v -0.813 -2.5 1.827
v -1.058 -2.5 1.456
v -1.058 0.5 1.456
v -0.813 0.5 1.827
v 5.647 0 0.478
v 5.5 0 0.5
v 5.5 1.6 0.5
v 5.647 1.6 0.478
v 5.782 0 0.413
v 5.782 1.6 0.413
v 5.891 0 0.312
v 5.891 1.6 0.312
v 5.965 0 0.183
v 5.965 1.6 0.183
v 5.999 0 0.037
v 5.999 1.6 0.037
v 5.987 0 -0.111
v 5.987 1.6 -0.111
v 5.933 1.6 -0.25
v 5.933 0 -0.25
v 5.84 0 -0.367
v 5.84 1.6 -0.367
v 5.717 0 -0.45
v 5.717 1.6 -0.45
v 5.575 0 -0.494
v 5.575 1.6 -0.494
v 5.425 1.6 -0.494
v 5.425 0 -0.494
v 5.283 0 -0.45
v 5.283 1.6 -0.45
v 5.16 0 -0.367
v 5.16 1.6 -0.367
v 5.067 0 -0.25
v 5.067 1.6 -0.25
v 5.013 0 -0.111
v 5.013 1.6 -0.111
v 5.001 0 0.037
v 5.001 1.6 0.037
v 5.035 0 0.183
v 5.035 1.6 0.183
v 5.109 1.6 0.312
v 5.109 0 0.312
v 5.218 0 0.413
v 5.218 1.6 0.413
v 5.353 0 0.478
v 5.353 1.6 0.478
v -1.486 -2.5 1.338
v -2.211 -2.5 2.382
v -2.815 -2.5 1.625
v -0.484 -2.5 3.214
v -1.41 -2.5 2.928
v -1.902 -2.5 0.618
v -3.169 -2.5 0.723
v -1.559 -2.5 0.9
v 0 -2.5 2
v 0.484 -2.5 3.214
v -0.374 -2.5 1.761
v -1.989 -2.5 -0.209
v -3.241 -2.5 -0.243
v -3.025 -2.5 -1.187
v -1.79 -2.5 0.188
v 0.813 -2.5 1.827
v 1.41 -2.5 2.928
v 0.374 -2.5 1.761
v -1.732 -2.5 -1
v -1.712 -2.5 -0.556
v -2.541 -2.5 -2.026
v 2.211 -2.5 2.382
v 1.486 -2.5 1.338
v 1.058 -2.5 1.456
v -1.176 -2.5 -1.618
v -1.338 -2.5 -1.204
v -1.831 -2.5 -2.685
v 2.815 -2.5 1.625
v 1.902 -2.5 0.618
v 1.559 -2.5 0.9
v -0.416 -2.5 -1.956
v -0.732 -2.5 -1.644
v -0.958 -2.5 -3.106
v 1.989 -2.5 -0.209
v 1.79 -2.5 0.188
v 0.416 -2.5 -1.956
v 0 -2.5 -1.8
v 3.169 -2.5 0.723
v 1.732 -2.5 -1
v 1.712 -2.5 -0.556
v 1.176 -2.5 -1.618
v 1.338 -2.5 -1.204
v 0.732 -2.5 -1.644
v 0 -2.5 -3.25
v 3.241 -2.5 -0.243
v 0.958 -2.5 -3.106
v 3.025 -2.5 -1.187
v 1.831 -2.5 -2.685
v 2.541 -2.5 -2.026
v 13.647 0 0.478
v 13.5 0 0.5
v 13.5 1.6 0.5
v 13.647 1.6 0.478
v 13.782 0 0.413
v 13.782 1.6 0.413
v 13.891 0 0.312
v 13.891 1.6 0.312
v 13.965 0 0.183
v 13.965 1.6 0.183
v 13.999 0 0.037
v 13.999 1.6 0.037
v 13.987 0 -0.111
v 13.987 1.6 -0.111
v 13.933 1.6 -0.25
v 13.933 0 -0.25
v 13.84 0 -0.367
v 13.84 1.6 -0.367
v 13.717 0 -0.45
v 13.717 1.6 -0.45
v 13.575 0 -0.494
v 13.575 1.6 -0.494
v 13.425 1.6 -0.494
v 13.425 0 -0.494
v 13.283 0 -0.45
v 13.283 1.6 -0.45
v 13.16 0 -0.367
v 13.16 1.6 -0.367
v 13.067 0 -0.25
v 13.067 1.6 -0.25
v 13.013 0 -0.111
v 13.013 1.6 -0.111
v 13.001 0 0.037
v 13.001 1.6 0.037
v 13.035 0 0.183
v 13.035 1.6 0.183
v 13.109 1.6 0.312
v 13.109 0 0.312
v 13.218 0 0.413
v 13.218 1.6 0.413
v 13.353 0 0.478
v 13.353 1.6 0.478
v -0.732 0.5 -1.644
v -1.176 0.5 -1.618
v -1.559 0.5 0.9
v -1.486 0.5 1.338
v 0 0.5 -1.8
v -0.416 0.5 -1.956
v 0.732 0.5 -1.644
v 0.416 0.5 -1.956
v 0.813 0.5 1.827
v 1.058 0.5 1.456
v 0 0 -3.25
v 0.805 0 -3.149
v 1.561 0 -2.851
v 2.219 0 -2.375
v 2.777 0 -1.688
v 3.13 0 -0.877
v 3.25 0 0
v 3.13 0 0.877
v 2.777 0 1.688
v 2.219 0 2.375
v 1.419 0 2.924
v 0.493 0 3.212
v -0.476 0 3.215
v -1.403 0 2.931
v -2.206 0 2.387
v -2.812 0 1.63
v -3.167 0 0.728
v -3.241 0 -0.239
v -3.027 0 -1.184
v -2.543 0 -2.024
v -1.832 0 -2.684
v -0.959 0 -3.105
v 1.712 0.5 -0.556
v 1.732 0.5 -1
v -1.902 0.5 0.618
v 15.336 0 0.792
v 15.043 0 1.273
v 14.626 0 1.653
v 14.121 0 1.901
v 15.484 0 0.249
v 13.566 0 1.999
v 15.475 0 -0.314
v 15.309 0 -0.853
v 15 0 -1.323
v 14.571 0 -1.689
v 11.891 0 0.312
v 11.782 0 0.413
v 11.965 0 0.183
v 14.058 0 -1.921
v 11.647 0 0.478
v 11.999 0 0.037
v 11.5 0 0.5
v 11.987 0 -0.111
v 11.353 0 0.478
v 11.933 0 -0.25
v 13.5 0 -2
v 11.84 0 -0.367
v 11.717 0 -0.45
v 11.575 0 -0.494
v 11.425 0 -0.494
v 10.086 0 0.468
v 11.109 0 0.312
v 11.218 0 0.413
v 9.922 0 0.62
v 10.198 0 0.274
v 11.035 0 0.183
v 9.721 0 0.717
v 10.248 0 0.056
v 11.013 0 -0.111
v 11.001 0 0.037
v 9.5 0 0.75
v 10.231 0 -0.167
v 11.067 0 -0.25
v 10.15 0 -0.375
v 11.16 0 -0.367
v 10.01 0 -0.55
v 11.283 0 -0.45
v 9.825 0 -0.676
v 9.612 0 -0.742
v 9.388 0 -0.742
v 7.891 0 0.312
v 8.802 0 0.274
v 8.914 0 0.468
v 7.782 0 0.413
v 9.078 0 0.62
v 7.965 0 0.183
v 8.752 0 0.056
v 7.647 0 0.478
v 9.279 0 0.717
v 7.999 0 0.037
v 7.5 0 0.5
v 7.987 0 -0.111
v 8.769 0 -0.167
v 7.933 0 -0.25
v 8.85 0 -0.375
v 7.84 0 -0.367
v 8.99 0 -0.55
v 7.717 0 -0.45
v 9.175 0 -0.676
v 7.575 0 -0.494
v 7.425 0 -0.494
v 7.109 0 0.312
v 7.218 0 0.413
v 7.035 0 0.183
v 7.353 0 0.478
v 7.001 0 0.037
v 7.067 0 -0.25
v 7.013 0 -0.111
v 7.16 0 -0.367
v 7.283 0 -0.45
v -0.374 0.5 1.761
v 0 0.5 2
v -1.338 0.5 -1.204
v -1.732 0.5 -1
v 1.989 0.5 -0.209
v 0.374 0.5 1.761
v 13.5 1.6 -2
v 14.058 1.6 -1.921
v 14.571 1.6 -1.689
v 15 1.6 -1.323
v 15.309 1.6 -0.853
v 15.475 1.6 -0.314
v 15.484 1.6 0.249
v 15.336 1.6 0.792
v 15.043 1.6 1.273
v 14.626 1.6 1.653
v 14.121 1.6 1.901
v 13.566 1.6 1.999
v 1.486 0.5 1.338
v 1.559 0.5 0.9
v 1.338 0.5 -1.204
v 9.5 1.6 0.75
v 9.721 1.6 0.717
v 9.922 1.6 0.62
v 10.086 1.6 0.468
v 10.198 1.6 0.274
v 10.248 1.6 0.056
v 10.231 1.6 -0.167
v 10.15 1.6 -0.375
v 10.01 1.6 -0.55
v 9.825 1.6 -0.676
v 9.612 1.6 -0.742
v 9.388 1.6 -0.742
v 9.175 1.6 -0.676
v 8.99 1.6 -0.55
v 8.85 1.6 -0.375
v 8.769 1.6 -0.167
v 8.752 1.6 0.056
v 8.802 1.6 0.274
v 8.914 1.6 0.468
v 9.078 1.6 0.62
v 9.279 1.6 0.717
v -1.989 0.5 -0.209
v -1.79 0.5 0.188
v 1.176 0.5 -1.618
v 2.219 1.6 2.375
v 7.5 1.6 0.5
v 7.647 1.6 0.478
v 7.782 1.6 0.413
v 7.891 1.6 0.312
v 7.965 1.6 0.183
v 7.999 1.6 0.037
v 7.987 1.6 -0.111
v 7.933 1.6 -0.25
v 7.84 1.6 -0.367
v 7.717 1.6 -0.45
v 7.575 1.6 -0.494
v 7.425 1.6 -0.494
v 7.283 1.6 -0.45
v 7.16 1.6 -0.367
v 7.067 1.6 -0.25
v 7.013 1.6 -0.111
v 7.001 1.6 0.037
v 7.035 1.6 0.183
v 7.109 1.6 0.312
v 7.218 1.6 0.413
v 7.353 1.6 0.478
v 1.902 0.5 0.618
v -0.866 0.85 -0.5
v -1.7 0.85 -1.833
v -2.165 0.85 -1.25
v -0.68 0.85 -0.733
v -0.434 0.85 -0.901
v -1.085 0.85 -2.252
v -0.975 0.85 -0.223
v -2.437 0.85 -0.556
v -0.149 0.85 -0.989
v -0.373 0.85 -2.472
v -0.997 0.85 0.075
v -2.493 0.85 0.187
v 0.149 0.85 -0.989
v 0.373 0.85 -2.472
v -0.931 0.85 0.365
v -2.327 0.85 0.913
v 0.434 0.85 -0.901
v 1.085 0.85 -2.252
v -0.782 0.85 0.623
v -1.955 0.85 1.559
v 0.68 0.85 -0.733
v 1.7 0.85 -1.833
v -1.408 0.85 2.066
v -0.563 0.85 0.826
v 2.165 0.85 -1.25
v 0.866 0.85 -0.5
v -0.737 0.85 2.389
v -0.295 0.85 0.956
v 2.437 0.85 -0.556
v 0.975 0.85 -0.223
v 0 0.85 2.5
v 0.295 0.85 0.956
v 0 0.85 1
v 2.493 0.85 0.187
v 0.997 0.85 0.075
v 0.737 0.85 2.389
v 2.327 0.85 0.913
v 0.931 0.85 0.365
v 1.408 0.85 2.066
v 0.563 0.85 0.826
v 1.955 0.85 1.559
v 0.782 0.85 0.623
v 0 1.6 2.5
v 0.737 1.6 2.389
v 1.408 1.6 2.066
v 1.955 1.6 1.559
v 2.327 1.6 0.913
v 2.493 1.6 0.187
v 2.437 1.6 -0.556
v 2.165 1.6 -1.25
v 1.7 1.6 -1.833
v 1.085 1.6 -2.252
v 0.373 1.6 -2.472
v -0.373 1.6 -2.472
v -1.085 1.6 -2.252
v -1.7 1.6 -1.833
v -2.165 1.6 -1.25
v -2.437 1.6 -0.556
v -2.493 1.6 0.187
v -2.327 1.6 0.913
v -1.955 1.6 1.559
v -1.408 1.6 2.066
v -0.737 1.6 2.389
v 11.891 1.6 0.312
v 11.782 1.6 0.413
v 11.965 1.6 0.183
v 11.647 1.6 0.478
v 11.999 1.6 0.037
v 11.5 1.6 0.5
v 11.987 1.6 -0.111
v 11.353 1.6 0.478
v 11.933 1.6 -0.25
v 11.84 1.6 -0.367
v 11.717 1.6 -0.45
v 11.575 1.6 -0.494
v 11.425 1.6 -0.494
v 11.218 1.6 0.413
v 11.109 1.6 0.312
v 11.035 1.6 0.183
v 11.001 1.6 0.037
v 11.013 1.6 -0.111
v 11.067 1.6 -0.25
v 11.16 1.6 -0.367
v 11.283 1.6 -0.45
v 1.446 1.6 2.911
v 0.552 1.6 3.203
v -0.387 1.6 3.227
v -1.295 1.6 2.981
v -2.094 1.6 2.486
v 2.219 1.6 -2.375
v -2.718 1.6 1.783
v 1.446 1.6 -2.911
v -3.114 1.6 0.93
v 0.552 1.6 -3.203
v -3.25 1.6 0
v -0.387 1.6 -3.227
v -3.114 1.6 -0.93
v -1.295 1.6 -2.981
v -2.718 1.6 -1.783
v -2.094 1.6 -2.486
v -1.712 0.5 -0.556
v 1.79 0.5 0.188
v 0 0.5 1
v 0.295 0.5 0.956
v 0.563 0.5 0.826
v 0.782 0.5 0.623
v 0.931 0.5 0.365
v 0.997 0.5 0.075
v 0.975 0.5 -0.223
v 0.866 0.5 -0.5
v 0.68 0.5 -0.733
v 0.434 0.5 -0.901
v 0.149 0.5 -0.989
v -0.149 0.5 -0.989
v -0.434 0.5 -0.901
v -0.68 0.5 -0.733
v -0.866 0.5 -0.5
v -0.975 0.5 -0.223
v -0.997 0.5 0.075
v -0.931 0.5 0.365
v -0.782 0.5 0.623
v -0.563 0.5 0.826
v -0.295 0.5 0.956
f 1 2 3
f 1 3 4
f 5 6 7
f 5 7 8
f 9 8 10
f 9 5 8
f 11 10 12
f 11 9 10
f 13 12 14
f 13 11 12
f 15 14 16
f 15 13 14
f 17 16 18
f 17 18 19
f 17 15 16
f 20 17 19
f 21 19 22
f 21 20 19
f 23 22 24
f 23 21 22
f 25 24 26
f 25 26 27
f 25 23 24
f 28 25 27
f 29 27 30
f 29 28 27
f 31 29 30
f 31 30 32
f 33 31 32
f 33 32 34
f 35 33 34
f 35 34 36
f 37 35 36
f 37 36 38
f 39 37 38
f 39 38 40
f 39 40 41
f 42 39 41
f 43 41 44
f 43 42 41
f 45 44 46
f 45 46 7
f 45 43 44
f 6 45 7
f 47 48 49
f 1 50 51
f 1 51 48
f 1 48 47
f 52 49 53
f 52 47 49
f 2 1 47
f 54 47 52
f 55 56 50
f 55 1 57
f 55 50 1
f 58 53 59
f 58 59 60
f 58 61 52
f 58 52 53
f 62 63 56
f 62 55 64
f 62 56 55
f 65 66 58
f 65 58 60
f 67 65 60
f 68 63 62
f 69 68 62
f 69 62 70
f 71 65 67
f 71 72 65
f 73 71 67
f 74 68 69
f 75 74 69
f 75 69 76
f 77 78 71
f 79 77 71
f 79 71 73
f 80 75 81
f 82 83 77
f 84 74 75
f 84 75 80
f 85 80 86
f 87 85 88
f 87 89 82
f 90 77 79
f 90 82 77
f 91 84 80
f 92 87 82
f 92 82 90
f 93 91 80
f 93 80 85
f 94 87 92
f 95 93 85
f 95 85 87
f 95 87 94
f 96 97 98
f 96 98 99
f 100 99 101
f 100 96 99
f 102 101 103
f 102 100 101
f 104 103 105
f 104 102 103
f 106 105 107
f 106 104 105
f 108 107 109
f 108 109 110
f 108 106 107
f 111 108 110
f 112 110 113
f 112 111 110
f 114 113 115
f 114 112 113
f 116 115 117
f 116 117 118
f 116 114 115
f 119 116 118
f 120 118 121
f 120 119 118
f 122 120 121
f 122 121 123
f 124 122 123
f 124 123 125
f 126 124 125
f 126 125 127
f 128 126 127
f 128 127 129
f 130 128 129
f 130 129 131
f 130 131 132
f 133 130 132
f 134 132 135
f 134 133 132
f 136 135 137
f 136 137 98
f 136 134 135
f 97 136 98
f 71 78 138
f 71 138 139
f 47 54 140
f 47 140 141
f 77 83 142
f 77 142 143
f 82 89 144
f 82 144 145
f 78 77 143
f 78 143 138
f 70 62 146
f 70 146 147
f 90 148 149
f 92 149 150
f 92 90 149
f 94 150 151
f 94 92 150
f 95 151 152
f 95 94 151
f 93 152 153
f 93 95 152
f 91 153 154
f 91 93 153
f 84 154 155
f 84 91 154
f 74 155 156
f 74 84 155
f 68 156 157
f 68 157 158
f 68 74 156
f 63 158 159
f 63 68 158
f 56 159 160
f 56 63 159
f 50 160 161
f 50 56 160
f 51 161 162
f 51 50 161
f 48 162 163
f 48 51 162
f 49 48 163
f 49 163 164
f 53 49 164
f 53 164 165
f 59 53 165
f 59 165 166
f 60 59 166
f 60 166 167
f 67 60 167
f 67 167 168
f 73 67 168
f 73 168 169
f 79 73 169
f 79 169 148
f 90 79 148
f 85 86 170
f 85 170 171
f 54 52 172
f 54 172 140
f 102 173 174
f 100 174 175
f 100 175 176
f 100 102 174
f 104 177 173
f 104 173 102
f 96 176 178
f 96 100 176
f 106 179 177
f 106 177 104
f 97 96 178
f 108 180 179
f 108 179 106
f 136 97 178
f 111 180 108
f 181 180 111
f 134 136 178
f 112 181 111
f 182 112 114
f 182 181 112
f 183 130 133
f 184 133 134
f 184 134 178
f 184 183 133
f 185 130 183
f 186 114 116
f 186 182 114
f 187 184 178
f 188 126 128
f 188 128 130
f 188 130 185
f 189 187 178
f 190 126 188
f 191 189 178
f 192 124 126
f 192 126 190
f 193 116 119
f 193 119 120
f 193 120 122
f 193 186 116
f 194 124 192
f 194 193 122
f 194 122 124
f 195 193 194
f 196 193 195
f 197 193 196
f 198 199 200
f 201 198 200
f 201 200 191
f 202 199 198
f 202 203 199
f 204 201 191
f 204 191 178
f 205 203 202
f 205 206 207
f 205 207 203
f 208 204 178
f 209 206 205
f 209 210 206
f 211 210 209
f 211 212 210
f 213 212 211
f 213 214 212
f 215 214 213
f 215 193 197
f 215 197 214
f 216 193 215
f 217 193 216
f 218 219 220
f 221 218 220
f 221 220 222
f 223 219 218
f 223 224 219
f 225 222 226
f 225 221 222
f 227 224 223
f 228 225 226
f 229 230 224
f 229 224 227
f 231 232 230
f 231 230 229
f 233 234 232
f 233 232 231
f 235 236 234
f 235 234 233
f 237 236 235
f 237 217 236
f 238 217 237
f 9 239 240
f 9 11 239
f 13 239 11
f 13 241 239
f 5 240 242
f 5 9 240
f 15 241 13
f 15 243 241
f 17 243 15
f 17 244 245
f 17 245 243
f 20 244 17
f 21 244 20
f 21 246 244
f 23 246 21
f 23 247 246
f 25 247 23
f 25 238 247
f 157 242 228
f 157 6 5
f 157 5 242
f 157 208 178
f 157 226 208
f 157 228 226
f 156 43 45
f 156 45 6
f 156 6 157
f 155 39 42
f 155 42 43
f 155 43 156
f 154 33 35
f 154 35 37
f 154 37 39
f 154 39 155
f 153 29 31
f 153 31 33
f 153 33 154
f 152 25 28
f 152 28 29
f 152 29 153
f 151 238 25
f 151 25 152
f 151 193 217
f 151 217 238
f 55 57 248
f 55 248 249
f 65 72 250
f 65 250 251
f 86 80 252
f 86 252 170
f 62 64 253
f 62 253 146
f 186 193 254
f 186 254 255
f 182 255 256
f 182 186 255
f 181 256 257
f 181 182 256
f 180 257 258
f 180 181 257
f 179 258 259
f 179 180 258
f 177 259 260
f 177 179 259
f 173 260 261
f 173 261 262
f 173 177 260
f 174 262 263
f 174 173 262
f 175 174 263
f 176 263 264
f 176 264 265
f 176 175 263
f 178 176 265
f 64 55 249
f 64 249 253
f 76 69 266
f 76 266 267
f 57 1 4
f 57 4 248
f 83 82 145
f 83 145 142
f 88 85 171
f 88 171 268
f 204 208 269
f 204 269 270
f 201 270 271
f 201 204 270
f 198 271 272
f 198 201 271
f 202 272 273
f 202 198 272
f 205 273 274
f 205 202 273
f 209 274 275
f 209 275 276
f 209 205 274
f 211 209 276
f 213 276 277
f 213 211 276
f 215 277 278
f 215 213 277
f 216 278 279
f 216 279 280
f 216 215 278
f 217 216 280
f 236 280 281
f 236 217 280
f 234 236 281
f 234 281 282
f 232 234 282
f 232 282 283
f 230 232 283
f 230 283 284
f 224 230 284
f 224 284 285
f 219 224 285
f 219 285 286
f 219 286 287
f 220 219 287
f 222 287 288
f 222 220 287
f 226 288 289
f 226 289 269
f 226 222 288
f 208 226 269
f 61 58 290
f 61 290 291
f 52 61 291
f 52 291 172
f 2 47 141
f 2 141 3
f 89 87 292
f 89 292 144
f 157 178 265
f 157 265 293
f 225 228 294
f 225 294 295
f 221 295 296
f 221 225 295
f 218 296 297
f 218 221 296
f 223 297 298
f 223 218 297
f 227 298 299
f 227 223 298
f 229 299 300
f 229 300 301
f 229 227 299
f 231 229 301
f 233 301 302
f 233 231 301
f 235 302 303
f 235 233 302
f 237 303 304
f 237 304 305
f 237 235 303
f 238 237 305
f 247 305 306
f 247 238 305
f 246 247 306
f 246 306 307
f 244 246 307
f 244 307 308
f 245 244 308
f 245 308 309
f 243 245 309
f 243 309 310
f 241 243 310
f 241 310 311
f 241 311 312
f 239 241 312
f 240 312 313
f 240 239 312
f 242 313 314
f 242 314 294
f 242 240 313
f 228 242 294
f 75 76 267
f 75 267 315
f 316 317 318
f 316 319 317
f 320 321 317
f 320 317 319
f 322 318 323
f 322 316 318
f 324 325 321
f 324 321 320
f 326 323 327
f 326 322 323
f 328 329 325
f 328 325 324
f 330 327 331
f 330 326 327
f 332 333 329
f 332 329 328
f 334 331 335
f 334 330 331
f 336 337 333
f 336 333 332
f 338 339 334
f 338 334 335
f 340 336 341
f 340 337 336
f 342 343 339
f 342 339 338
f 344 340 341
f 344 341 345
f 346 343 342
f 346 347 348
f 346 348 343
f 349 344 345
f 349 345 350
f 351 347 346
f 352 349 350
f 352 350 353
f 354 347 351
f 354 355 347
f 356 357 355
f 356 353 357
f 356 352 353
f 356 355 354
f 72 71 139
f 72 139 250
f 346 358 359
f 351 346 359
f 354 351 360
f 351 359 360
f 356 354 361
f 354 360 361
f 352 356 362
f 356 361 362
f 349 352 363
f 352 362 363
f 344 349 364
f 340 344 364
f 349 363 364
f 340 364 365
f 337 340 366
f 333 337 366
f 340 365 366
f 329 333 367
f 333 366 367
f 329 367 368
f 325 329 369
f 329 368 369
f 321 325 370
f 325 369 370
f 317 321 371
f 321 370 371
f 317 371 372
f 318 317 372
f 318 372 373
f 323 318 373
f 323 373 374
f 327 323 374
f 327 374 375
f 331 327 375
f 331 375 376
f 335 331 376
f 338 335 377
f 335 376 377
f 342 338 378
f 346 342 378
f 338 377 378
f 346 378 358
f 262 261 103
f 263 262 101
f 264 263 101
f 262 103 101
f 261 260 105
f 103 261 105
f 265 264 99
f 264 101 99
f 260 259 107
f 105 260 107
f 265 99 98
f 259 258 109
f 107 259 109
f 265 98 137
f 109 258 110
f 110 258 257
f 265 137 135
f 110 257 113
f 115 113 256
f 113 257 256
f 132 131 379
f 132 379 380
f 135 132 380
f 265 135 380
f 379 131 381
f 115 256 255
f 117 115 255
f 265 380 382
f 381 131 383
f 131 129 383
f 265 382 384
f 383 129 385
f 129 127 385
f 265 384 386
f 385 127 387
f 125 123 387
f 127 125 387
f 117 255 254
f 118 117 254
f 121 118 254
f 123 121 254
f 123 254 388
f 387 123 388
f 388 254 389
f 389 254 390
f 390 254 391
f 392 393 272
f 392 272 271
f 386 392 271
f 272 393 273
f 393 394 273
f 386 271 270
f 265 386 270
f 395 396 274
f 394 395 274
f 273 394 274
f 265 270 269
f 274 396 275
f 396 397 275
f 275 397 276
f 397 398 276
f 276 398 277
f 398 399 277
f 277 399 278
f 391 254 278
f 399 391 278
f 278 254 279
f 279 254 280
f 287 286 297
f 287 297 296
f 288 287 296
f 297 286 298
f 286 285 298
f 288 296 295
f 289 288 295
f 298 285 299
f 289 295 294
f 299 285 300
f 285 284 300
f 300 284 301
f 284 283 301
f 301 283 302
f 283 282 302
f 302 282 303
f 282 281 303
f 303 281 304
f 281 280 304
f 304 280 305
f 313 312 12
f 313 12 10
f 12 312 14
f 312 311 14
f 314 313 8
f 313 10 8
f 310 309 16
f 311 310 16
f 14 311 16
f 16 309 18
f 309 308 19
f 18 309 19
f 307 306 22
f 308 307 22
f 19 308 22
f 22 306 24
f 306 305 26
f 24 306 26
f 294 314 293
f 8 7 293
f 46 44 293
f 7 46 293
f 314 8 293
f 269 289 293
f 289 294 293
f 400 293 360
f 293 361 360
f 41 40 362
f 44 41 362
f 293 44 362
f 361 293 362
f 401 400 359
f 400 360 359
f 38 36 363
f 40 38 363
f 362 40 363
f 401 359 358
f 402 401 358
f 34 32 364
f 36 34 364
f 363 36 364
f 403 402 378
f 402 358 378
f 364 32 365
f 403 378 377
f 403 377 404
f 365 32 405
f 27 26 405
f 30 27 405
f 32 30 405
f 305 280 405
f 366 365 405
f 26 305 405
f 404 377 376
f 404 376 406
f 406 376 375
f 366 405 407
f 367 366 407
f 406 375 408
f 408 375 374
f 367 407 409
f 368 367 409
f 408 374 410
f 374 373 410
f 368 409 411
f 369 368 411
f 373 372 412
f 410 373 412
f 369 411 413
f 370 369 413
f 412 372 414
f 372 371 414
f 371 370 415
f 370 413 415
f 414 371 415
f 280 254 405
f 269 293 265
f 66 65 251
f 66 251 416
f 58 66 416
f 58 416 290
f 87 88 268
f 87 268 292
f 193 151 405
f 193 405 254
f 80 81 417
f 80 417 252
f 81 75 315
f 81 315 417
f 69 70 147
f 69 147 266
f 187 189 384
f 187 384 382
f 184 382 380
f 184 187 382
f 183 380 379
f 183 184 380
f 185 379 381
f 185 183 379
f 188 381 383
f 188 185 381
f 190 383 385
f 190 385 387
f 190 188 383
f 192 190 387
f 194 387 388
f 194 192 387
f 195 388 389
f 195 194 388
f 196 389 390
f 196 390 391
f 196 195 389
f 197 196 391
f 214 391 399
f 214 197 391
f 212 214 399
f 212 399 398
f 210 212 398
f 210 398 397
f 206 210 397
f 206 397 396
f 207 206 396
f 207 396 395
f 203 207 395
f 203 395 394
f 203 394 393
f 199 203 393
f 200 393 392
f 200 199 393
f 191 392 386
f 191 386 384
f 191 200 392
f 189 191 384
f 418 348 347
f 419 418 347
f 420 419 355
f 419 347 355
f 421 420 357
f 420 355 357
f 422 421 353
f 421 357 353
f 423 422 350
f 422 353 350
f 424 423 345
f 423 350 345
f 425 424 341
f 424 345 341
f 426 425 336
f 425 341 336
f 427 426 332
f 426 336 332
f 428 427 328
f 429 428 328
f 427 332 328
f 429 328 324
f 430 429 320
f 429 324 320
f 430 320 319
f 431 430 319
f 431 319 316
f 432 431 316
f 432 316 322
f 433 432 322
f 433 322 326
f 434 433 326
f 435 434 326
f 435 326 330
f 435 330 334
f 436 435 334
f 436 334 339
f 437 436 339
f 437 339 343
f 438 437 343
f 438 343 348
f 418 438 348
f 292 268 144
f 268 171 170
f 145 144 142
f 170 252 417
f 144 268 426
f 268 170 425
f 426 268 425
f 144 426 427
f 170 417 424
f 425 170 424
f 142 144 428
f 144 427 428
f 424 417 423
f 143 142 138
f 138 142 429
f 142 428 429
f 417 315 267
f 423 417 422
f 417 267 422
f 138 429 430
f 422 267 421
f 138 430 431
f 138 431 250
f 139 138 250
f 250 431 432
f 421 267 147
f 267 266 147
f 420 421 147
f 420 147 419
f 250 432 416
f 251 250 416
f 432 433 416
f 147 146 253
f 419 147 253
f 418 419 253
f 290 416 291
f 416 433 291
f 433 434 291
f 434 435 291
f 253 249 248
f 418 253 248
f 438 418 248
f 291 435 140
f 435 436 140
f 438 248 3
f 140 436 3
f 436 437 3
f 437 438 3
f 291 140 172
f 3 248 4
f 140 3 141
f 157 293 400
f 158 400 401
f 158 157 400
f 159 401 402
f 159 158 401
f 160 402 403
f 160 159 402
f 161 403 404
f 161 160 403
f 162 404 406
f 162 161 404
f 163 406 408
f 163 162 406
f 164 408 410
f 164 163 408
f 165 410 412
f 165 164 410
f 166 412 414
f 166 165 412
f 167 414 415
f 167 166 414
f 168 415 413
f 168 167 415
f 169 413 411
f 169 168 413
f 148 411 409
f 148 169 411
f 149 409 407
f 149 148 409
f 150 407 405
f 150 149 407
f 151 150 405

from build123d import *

# Parameters (mm, degrees)
SKETCH1_R           = 0.5
SKETCH1_R_2         = 0.75
BOSS_EXTRUDE1_DEPTH = 1.6
BOSS_EXTRUDE2_START = 2.5
SKETCH2_R           = 3.25
BOSS_EXTRUDE2_DEPTH = 2.5
SKETCH4_R           = 1
CUT_EXTRUDE1_DEPTH  = 17.359171739
CUT_EXTRUDE2_DEPTH  = 3
SKETCH3_R           = 2.5
CUT_EXTRUDE3_DEPTH  = 0.75


with BuildPart() as part:
    # Sketch1 → Boss-Extrude1 (new body)
    with BuildSketch(Plane(origin=(0, 0, 0), x_dir=(1, 0, 0), z_dir=(0, 1, 0))):
        with BuildLine():
            Line((2.218529919, 2.375), (13.5, 2))
            ThreePointArc((13.5, 2), (15.499725592, 0.033129364), (13.566249638, -1.998902445))
            Line((13.566249638, -1.998902445), (2.218529919, -2.375))
            ThreePointArc((2.218529919, -2.375), (-3.25, 0), (2.218529919, 2.375))
        make_face()
        with Locations(Location((13.5, 0, 0), (0, 0, 270))):
            Circle(SKETCH1_R, mode=Mode.SUBTRACT)
        with Locations(Location((11.5, 0, 0), (0, 0, 270))):
            Circle(SKETCH1_R, mode=Mode.SUBTRACT)
        with Locations(Location((9.5, 0, 0), (0, 0, 270))):
            Circle(SKETCH1_R_2, mode=Mode.SUBTRACT)
        with Locations(Location((7.5, 0, 0), (0, 0, 270))):
            Circle(SKETCH1_R, mode=Mode.SUBTRACT)
        with Locations(Location((5.5, 0, 0), (0, 0, 270))):
            Circle(SKETCH1_R, mode=Mode.SUBTRACT)
    extrude(amount=BOSS_EXTRUDE1_DEPTH)

    # Sketch2 → Boss-Extrude2 (add)
    with BuildSketch(Plane.XZ.offset(BOSS_EXTRUDE2_START)):
        with Locations(Location((0, 0, 0), (0, 0, 270))):
            Circle(SKETCH2_R)
    extrude(amount=-BOSS_EXTRUDE2_DEPTH)

    # Sketch4 → Cut-Extrude1 (cut, through all)
    with BuildSketch(Plane(origin=(0, 1.6, 0), x_dir=(1, 0, 0), z_dir=(0, 1, 0))):
        with Locations(Location((0, 0, 0), (0, 0, 270))):
            Circle(SKETCH4_R)
    extrude(amount=-CUT_EXTRUDE1_DEPTH, mode=Mode.SUBTRACT)

    # Sketch5 → Cut-Extrude2 (cut)
    with BuildSketch(Plane.XZ.offset(2.5)):
        Polygon((0, 2), (0.374241043, 1.760665681), (0.813473286, 1.827090915), (1.058013454, 1.45623059), (1.486289651, 1.338261213), (1.558845727, 0.9), (1.902113033, 0.618033989), (1.790139412, 0.188151234), (1.989043791, -0.209056927), (1.711901729, -0.55623059), (1.732050808, -1), (1.337660686, -1.204435091), (1.175570505, -1.618033989), (0.732125958, -1.644381824), (0.415823382, -1.956295201), (0, -1.8), (-0.415823382, -1.956295201), (-0.732125958, -1.644381824), (-1.175570505, -1.618033989), (-1.337660686, -1.204435091), (-1.732050808, -1), (-1.711901729, -0.55623059), (-1.989043791, -0.209056927), (-1.790139412, 0.188151234), (-1.902113033, 0.618033989), (-1.558845727, 0.9), (-1.486289651, 1.338261213), (-1.058013454, 1.45623059), (-0.813473286, 1.827090915), (-0.374241043, 1.760665681), align=None)
    extrude(amount=-CUT_EXTRUDE2_DEPTH, mode=Mode.SUBTRACT)

    # Sketch3 → Cut-Extrude3 (cut)
    with BuildSketch(Plane(origin=(0, 1.6, 0), x_dir=(1, 0, 0), z_dir=(0, 1, 0))):
        with Locations(Location((0, 0, 0), (0, 0, 270))):
            Circle(SKETCH3_R)
    extrude(amount=-CUT_EXTRUDE3_DEPTH, mode=Mode.SUBTRACT)


solid = part.part
